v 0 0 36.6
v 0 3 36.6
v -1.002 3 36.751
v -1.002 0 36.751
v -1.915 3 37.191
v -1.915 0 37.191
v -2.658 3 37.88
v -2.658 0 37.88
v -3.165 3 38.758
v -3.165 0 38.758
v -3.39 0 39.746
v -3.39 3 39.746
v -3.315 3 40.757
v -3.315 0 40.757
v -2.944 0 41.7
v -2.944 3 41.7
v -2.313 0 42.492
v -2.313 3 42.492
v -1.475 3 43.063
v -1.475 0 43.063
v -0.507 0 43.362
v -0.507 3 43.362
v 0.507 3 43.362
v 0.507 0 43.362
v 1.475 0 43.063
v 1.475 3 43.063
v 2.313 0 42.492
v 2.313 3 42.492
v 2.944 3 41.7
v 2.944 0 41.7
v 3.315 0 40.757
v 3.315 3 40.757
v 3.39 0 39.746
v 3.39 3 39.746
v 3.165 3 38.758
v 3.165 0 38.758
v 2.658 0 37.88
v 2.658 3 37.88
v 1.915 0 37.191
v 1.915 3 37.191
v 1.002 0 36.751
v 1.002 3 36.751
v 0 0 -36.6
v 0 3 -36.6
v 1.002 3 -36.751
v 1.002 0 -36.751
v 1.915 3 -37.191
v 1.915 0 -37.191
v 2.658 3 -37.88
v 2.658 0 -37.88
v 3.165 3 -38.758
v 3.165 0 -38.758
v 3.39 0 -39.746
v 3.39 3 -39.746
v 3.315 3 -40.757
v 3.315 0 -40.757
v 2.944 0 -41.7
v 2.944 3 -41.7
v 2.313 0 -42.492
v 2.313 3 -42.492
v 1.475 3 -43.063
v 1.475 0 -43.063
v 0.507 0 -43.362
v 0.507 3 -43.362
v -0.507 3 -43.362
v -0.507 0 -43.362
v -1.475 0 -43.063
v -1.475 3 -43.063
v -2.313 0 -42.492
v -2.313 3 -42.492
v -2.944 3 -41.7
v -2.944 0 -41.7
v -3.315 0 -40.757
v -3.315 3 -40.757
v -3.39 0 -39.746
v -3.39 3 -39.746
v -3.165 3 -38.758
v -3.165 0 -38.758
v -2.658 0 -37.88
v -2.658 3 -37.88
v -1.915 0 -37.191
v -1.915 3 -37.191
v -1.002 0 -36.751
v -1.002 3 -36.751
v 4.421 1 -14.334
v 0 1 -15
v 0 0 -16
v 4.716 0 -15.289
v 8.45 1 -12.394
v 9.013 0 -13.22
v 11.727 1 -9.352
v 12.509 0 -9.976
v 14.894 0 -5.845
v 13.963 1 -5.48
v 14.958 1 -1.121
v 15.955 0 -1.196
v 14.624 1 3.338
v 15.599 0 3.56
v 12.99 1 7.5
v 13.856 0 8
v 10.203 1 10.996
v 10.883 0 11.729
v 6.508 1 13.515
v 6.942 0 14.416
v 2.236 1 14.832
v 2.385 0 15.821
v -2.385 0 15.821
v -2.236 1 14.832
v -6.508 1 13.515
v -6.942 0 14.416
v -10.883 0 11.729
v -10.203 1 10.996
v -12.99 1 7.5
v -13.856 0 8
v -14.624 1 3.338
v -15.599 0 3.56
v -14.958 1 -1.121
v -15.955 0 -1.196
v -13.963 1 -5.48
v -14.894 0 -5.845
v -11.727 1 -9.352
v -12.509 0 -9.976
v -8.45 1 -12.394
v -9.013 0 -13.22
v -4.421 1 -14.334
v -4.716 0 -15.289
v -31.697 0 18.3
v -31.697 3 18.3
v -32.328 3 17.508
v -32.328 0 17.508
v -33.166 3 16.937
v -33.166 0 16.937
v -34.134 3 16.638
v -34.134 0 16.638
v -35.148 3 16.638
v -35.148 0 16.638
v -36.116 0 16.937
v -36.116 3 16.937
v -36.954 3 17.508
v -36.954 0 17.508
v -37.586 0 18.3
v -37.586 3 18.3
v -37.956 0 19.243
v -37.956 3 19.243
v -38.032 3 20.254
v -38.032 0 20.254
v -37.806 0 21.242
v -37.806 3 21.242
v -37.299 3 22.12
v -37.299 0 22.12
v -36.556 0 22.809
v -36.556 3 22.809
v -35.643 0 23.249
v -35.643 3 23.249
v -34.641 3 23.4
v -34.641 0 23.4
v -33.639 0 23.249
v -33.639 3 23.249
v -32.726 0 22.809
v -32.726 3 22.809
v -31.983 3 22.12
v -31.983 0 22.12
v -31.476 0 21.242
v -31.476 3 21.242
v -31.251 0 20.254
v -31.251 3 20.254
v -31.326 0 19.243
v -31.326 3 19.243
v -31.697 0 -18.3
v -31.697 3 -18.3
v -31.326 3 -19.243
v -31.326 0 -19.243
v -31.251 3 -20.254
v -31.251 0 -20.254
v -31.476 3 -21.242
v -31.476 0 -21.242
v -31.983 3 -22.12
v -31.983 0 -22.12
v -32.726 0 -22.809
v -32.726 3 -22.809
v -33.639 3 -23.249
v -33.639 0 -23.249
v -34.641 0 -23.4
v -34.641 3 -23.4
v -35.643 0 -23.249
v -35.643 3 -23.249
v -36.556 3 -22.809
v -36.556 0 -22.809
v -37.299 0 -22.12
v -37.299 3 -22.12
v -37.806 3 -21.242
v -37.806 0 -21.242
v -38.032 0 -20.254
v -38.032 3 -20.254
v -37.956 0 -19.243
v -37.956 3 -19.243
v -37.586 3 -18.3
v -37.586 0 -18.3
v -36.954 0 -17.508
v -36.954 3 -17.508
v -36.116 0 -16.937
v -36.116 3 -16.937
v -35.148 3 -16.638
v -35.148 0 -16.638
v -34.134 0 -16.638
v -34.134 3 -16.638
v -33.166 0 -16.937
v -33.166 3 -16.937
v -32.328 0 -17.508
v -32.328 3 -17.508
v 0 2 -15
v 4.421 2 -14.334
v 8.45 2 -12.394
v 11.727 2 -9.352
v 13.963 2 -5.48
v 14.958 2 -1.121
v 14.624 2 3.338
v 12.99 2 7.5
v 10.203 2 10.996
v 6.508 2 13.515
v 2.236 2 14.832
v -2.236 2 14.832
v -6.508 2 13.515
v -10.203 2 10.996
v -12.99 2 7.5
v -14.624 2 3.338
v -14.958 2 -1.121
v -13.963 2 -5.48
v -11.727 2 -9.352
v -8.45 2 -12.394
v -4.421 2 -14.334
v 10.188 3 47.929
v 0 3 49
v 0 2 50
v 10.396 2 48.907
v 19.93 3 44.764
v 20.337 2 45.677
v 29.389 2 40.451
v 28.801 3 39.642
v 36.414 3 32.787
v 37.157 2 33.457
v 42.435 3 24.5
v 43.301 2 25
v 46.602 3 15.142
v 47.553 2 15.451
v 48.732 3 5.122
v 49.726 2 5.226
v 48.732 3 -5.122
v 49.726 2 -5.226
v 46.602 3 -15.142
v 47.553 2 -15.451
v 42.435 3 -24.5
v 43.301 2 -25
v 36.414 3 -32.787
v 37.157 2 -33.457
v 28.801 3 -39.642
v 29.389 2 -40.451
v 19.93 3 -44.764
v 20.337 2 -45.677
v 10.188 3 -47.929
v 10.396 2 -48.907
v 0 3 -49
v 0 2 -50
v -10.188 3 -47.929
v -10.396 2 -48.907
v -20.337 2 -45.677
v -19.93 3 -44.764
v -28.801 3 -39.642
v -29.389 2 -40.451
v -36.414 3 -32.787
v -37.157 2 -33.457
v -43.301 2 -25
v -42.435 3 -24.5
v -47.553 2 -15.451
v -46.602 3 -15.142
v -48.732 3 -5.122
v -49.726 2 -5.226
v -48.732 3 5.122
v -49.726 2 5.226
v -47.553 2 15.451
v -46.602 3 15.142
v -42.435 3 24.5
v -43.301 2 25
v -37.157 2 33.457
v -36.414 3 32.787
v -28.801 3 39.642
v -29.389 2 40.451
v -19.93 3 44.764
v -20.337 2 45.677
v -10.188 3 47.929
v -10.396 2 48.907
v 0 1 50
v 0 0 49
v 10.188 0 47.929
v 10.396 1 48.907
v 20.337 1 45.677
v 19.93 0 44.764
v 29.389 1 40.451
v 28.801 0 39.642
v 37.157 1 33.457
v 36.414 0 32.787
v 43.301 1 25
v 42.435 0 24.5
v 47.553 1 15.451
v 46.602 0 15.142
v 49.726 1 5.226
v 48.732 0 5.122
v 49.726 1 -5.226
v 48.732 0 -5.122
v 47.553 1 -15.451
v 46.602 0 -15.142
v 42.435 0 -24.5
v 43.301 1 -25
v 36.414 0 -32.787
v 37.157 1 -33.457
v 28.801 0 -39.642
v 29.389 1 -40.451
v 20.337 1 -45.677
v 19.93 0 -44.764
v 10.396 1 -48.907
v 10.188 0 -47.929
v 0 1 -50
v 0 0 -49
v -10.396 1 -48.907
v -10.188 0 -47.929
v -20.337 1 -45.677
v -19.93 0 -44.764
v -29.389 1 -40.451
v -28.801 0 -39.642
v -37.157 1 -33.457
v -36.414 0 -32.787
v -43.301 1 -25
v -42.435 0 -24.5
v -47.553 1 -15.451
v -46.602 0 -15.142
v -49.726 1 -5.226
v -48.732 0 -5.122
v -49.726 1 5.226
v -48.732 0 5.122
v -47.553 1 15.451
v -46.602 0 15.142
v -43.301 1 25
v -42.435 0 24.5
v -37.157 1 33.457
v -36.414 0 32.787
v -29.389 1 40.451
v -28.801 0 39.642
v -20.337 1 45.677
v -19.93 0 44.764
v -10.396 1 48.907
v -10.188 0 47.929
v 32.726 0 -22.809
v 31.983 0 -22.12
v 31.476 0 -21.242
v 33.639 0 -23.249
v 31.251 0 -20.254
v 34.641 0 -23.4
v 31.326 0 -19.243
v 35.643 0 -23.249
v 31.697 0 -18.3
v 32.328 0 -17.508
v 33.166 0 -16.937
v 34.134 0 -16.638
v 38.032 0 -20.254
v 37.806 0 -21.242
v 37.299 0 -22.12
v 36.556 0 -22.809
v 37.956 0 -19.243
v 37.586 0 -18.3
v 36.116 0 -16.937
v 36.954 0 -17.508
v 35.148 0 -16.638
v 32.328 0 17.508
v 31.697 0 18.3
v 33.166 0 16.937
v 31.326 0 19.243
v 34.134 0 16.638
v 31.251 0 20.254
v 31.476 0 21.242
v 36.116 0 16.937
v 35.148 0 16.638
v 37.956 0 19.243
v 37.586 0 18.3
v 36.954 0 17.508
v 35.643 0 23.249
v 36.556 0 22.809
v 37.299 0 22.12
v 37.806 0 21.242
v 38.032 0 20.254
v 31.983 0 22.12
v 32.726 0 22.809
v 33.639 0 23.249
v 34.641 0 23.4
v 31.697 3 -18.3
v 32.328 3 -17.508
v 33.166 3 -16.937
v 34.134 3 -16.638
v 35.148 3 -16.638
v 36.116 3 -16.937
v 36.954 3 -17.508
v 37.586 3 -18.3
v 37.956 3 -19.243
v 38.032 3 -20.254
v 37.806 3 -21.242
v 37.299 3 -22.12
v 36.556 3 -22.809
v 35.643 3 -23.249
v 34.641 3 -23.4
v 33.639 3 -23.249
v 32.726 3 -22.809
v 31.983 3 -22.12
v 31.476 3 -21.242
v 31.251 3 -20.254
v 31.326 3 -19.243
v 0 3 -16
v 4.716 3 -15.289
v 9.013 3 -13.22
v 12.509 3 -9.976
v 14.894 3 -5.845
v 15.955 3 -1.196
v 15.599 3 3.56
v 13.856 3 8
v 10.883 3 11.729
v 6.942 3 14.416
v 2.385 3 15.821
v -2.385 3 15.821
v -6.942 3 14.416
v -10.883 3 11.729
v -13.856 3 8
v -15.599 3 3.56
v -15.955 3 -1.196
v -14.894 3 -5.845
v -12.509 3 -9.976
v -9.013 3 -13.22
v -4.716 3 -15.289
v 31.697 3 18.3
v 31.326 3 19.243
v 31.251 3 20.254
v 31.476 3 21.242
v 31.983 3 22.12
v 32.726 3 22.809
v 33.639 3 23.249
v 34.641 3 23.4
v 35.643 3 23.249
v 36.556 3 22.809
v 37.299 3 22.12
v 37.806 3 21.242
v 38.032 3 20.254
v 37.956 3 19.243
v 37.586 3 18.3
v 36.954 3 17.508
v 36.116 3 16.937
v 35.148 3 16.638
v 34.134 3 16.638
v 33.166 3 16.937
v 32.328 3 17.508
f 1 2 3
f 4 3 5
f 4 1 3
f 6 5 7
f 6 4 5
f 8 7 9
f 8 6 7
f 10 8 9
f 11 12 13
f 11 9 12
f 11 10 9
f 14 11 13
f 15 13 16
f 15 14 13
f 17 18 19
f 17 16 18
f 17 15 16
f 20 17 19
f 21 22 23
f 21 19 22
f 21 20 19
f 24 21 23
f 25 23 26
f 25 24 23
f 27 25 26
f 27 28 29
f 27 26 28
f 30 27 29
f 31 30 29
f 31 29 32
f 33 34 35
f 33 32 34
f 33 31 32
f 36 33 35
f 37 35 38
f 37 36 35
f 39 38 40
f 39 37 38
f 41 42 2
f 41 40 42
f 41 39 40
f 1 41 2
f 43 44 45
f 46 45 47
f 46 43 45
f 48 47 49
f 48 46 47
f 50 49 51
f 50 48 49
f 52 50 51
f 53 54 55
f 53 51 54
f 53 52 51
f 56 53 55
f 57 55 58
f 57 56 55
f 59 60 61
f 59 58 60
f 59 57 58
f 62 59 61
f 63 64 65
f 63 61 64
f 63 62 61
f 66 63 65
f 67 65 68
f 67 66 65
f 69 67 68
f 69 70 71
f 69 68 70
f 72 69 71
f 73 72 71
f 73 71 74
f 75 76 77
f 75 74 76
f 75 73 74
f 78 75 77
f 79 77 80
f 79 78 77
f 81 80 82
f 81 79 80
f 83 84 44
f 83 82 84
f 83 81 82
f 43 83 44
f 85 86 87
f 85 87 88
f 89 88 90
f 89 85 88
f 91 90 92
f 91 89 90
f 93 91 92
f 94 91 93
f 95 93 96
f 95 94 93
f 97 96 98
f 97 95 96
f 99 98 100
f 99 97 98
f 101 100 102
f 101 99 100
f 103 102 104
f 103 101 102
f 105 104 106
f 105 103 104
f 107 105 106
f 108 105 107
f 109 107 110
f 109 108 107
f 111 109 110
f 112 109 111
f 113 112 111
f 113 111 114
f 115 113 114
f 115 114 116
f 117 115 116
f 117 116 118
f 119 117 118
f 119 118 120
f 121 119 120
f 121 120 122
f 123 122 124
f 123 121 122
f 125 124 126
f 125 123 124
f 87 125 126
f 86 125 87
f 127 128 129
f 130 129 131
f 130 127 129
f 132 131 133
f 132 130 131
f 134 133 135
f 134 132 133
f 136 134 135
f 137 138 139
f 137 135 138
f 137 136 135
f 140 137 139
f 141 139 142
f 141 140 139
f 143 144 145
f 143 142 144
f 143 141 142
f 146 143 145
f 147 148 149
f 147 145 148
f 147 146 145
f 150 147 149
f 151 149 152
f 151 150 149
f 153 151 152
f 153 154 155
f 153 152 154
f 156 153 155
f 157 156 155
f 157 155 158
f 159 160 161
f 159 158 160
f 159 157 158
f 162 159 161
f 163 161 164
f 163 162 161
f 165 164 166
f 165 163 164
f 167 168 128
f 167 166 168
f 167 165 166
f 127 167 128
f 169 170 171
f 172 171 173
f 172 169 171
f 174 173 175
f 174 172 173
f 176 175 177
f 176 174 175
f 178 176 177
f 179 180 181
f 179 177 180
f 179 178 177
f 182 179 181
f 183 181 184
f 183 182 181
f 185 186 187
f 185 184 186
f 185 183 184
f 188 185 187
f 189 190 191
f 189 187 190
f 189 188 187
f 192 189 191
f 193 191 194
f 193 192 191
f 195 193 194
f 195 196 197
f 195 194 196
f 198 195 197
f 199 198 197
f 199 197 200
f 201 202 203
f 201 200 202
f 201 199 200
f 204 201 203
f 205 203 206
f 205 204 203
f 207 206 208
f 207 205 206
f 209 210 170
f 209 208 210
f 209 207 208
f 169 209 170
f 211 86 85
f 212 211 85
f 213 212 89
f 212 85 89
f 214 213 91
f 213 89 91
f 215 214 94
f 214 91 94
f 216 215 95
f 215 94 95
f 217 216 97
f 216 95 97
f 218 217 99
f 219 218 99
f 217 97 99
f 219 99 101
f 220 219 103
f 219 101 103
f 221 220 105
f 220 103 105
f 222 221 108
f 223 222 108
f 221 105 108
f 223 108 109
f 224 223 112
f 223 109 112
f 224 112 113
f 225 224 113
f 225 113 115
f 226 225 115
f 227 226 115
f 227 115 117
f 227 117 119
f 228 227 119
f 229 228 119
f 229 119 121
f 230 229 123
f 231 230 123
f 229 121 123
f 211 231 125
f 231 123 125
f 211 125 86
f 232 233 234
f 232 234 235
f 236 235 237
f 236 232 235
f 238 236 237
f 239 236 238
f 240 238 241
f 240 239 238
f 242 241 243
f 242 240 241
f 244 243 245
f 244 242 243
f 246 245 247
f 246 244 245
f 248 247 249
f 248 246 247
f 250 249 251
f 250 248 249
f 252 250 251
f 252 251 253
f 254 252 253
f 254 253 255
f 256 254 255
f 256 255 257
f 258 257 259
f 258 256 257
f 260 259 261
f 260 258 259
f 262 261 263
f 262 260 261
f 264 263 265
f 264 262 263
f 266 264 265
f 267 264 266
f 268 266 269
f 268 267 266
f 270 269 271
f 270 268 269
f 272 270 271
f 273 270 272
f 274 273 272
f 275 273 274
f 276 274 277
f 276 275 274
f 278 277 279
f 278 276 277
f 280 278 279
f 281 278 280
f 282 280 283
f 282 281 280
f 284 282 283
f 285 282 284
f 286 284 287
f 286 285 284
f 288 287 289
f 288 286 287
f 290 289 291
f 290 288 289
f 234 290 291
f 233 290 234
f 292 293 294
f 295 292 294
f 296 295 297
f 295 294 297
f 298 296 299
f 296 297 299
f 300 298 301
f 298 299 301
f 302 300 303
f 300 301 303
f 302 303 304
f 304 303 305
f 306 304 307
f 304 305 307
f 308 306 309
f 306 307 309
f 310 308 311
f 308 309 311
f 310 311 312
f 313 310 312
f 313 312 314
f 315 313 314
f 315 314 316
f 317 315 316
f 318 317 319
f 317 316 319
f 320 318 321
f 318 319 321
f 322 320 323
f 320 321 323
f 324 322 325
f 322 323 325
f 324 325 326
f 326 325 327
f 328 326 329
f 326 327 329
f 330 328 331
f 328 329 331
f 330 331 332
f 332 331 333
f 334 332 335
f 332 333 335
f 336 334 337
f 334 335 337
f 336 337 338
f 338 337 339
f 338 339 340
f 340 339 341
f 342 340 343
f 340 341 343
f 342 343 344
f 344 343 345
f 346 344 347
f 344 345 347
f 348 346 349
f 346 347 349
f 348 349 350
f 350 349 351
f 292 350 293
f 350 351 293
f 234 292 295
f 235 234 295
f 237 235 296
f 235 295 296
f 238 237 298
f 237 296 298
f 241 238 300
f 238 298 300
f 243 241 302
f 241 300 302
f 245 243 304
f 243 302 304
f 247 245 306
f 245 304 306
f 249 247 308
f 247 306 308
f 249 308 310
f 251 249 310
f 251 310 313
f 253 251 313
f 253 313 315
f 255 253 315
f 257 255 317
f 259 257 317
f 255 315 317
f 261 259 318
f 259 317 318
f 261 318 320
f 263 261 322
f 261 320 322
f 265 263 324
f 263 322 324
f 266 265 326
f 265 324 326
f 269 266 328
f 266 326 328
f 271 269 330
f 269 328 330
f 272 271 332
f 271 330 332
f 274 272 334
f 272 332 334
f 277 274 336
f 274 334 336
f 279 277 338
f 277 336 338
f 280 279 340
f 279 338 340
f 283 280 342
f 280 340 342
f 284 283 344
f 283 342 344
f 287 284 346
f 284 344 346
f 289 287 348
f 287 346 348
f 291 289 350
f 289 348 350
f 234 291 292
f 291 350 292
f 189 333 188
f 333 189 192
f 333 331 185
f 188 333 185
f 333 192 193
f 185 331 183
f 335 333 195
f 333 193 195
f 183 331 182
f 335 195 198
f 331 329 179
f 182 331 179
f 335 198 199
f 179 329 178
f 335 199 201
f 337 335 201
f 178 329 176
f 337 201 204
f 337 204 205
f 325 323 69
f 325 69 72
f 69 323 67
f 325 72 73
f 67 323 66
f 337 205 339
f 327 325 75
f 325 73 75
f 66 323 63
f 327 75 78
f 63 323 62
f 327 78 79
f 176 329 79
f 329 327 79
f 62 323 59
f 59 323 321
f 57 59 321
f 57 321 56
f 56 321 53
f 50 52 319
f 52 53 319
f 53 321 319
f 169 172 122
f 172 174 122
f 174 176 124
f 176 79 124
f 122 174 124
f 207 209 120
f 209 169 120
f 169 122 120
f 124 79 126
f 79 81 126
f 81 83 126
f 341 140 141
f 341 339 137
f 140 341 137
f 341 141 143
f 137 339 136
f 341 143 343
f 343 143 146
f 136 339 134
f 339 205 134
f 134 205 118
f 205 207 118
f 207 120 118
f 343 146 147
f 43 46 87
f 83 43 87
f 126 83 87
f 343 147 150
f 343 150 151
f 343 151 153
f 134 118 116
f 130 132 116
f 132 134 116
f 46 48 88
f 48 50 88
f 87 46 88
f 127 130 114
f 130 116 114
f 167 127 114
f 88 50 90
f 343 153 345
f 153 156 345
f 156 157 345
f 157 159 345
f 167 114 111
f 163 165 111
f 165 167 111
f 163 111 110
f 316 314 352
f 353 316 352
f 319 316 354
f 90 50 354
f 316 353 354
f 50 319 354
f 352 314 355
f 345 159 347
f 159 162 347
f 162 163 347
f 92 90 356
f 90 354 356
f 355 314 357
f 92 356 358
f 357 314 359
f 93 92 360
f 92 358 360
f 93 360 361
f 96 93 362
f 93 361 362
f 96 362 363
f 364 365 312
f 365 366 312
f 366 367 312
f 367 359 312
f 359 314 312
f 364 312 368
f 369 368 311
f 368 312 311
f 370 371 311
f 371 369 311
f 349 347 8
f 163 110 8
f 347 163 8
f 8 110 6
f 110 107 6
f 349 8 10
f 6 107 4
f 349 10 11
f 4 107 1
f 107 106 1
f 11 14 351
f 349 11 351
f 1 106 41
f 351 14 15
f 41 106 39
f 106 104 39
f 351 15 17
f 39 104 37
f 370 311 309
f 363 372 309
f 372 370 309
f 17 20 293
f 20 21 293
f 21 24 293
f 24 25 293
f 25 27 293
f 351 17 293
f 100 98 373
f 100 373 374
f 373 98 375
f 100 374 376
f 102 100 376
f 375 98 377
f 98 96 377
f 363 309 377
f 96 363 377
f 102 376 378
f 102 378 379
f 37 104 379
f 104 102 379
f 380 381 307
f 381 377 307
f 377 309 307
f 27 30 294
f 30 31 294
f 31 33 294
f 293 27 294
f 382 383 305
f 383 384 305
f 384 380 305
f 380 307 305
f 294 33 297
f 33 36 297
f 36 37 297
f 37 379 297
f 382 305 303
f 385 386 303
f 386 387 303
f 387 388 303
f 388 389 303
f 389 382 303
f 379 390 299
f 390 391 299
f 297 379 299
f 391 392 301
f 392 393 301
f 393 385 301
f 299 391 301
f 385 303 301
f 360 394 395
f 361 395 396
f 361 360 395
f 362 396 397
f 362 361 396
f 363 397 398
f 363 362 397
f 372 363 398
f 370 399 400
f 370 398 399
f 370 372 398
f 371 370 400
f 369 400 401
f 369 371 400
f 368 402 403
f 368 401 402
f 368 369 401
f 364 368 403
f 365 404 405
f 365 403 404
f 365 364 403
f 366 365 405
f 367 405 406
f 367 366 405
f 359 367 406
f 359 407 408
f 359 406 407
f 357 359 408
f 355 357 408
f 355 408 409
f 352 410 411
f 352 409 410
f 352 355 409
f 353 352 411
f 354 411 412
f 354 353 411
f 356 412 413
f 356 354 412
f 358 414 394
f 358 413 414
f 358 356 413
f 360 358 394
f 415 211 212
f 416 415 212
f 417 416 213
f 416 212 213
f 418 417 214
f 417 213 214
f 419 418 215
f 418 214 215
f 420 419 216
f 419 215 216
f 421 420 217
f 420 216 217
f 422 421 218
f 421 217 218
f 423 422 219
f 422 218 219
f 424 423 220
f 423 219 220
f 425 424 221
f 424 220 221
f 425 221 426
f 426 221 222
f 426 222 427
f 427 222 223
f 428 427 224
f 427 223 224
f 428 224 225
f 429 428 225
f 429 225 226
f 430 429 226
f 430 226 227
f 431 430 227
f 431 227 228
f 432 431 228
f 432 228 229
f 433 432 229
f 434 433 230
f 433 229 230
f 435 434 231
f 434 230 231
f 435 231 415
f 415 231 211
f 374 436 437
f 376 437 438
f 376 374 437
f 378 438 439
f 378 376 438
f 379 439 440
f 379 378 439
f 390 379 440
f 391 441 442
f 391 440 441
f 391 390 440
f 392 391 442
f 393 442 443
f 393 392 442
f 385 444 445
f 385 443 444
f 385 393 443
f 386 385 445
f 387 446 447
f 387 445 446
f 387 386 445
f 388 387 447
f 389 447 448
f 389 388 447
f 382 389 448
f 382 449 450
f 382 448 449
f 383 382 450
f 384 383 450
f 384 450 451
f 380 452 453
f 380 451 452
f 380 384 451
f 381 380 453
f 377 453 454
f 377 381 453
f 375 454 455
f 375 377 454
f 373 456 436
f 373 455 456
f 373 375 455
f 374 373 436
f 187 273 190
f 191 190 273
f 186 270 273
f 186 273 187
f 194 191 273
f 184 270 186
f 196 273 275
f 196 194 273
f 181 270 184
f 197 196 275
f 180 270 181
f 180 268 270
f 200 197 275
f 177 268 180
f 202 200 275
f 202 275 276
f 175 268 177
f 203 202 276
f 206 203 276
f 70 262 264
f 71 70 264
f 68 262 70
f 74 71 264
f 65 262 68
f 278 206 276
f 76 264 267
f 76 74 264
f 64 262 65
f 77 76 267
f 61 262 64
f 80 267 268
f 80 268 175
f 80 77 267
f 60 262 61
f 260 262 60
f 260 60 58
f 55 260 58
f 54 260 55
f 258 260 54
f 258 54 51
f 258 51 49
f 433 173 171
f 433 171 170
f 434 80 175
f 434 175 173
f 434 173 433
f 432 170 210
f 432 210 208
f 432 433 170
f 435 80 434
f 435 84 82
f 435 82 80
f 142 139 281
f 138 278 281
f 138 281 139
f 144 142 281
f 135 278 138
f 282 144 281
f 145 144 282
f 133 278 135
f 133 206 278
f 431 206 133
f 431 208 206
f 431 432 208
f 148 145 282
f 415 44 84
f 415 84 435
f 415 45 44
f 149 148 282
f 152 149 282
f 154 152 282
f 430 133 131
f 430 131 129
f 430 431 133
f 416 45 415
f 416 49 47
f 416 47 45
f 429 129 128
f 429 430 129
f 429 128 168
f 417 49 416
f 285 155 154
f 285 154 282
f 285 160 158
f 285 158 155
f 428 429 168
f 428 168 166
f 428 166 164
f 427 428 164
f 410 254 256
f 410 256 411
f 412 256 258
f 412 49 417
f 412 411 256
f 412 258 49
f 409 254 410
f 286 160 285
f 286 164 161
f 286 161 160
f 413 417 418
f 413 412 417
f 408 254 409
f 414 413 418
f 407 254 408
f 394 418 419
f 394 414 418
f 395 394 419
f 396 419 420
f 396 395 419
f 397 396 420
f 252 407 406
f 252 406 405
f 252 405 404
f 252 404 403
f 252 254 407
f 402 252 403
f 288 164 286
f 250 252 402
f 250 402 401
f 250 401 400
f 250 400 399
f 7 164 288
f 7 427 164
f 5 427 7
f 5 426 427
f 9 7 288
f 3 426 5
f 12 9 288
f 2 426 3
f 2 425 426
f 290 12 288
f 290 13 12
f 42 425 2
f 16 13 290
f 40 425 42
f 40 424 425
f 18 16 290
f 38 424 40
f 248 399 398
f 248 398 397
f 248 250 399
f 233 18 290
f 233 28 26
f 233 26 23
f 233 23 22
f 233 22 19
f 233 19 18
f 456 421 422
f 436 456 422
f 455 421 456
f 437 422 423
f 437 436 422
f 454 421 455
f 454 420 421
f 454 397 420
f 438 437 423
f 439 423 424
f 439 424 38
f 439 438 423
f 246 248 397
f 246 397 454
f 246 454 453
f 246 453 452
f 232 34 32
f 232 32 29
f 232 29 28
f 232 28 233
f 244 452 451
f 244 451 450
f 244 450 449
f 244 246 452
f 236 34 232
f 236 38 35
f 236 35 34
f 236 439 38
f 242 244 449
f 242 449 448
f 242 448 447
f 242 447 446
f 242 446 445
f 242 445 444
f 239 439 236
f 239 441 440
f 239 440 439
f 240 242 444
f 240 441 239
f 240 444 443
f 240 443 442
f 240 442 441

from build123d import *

# Parameters (mm, degrees)
SKETCH_1_R               = 50
EXTRUDE_1_DEPTH          = 3
PATTERN_CIRCULAR_1_COUNT = 6
SKETCH_7_R               = 15
CUT_EXTRUDE_1_DEPTH      = 3
CHAMFER_1_SIZE           = 1


with BuildPart() as part:
    # 草图1 → 凸台-拉伸1 (new body)
    with BuildSketch(Plane(origin=(0, 0, 0), x_dir=(1, 0, 0), z_dir=(0, 1, 0))):
        with Locations(Location((0, 0, 0), (0, 0, 270))):
            Circle(SKETCH_1_R)
    extrude(amount=EXTRUDE_1_DEPTH)

    # 草图6 → M8 螺纹孔的螺纹孔钻头1 (revolve, cut)
    with BuildSketch(Plane(origin=(0, 0, 40), x_dir=(0, 0, -1), z_dir=(1, 0, 0))):
        Polygon((0, 0), (0, 18.042926105), (3.4, 16), (3.4, 0), align=None)
    hole_wizard_m8_1 = revolve(axis=Axis((0, -6.35, 40), (0, 1, 0)), mode=Mode.SUBTRACT)

    # 阵列(圆周)1: M8 螺纹孔的螺纹孔钻头1 ×6 about axis
    pattern_circular_1_axis = Axis((0, 0, 0), (0, 1, 0))
    for i in range(1, PATTERN_CIRCULAR_1_COUNT):
        add(hole_wizard_m8_1.rotate(pattern_circular_1_axis, i * 360 / PATTERN_CIRCULAR_1_COUNT), mode=Mode.SUBTRACT)

    # 草图7 → 切除-拉伸1 (cut)
    with BuildSketch(Plane.XZ):
        with Locations(Location((0, 0, 0), (0, 0, 270))):
            Circle(SKETCH_7_R)
    extrude(amount=-CUT_EXTRUDE_1_DEPTH, mode=Mode.SUBTRACT)

    # 倒角1
    chamfer_1_edges = [part.edges().sort_by_distance(p)[0] for p in [
        (0, 0, -50),
        (0, 3, 15),
        (0, 0, 15),
        (0, 3, -50),
    ]]
    chamfer(chamfer_1_edges, length=CHAMFER_1_SIZE)


solid = part.part
